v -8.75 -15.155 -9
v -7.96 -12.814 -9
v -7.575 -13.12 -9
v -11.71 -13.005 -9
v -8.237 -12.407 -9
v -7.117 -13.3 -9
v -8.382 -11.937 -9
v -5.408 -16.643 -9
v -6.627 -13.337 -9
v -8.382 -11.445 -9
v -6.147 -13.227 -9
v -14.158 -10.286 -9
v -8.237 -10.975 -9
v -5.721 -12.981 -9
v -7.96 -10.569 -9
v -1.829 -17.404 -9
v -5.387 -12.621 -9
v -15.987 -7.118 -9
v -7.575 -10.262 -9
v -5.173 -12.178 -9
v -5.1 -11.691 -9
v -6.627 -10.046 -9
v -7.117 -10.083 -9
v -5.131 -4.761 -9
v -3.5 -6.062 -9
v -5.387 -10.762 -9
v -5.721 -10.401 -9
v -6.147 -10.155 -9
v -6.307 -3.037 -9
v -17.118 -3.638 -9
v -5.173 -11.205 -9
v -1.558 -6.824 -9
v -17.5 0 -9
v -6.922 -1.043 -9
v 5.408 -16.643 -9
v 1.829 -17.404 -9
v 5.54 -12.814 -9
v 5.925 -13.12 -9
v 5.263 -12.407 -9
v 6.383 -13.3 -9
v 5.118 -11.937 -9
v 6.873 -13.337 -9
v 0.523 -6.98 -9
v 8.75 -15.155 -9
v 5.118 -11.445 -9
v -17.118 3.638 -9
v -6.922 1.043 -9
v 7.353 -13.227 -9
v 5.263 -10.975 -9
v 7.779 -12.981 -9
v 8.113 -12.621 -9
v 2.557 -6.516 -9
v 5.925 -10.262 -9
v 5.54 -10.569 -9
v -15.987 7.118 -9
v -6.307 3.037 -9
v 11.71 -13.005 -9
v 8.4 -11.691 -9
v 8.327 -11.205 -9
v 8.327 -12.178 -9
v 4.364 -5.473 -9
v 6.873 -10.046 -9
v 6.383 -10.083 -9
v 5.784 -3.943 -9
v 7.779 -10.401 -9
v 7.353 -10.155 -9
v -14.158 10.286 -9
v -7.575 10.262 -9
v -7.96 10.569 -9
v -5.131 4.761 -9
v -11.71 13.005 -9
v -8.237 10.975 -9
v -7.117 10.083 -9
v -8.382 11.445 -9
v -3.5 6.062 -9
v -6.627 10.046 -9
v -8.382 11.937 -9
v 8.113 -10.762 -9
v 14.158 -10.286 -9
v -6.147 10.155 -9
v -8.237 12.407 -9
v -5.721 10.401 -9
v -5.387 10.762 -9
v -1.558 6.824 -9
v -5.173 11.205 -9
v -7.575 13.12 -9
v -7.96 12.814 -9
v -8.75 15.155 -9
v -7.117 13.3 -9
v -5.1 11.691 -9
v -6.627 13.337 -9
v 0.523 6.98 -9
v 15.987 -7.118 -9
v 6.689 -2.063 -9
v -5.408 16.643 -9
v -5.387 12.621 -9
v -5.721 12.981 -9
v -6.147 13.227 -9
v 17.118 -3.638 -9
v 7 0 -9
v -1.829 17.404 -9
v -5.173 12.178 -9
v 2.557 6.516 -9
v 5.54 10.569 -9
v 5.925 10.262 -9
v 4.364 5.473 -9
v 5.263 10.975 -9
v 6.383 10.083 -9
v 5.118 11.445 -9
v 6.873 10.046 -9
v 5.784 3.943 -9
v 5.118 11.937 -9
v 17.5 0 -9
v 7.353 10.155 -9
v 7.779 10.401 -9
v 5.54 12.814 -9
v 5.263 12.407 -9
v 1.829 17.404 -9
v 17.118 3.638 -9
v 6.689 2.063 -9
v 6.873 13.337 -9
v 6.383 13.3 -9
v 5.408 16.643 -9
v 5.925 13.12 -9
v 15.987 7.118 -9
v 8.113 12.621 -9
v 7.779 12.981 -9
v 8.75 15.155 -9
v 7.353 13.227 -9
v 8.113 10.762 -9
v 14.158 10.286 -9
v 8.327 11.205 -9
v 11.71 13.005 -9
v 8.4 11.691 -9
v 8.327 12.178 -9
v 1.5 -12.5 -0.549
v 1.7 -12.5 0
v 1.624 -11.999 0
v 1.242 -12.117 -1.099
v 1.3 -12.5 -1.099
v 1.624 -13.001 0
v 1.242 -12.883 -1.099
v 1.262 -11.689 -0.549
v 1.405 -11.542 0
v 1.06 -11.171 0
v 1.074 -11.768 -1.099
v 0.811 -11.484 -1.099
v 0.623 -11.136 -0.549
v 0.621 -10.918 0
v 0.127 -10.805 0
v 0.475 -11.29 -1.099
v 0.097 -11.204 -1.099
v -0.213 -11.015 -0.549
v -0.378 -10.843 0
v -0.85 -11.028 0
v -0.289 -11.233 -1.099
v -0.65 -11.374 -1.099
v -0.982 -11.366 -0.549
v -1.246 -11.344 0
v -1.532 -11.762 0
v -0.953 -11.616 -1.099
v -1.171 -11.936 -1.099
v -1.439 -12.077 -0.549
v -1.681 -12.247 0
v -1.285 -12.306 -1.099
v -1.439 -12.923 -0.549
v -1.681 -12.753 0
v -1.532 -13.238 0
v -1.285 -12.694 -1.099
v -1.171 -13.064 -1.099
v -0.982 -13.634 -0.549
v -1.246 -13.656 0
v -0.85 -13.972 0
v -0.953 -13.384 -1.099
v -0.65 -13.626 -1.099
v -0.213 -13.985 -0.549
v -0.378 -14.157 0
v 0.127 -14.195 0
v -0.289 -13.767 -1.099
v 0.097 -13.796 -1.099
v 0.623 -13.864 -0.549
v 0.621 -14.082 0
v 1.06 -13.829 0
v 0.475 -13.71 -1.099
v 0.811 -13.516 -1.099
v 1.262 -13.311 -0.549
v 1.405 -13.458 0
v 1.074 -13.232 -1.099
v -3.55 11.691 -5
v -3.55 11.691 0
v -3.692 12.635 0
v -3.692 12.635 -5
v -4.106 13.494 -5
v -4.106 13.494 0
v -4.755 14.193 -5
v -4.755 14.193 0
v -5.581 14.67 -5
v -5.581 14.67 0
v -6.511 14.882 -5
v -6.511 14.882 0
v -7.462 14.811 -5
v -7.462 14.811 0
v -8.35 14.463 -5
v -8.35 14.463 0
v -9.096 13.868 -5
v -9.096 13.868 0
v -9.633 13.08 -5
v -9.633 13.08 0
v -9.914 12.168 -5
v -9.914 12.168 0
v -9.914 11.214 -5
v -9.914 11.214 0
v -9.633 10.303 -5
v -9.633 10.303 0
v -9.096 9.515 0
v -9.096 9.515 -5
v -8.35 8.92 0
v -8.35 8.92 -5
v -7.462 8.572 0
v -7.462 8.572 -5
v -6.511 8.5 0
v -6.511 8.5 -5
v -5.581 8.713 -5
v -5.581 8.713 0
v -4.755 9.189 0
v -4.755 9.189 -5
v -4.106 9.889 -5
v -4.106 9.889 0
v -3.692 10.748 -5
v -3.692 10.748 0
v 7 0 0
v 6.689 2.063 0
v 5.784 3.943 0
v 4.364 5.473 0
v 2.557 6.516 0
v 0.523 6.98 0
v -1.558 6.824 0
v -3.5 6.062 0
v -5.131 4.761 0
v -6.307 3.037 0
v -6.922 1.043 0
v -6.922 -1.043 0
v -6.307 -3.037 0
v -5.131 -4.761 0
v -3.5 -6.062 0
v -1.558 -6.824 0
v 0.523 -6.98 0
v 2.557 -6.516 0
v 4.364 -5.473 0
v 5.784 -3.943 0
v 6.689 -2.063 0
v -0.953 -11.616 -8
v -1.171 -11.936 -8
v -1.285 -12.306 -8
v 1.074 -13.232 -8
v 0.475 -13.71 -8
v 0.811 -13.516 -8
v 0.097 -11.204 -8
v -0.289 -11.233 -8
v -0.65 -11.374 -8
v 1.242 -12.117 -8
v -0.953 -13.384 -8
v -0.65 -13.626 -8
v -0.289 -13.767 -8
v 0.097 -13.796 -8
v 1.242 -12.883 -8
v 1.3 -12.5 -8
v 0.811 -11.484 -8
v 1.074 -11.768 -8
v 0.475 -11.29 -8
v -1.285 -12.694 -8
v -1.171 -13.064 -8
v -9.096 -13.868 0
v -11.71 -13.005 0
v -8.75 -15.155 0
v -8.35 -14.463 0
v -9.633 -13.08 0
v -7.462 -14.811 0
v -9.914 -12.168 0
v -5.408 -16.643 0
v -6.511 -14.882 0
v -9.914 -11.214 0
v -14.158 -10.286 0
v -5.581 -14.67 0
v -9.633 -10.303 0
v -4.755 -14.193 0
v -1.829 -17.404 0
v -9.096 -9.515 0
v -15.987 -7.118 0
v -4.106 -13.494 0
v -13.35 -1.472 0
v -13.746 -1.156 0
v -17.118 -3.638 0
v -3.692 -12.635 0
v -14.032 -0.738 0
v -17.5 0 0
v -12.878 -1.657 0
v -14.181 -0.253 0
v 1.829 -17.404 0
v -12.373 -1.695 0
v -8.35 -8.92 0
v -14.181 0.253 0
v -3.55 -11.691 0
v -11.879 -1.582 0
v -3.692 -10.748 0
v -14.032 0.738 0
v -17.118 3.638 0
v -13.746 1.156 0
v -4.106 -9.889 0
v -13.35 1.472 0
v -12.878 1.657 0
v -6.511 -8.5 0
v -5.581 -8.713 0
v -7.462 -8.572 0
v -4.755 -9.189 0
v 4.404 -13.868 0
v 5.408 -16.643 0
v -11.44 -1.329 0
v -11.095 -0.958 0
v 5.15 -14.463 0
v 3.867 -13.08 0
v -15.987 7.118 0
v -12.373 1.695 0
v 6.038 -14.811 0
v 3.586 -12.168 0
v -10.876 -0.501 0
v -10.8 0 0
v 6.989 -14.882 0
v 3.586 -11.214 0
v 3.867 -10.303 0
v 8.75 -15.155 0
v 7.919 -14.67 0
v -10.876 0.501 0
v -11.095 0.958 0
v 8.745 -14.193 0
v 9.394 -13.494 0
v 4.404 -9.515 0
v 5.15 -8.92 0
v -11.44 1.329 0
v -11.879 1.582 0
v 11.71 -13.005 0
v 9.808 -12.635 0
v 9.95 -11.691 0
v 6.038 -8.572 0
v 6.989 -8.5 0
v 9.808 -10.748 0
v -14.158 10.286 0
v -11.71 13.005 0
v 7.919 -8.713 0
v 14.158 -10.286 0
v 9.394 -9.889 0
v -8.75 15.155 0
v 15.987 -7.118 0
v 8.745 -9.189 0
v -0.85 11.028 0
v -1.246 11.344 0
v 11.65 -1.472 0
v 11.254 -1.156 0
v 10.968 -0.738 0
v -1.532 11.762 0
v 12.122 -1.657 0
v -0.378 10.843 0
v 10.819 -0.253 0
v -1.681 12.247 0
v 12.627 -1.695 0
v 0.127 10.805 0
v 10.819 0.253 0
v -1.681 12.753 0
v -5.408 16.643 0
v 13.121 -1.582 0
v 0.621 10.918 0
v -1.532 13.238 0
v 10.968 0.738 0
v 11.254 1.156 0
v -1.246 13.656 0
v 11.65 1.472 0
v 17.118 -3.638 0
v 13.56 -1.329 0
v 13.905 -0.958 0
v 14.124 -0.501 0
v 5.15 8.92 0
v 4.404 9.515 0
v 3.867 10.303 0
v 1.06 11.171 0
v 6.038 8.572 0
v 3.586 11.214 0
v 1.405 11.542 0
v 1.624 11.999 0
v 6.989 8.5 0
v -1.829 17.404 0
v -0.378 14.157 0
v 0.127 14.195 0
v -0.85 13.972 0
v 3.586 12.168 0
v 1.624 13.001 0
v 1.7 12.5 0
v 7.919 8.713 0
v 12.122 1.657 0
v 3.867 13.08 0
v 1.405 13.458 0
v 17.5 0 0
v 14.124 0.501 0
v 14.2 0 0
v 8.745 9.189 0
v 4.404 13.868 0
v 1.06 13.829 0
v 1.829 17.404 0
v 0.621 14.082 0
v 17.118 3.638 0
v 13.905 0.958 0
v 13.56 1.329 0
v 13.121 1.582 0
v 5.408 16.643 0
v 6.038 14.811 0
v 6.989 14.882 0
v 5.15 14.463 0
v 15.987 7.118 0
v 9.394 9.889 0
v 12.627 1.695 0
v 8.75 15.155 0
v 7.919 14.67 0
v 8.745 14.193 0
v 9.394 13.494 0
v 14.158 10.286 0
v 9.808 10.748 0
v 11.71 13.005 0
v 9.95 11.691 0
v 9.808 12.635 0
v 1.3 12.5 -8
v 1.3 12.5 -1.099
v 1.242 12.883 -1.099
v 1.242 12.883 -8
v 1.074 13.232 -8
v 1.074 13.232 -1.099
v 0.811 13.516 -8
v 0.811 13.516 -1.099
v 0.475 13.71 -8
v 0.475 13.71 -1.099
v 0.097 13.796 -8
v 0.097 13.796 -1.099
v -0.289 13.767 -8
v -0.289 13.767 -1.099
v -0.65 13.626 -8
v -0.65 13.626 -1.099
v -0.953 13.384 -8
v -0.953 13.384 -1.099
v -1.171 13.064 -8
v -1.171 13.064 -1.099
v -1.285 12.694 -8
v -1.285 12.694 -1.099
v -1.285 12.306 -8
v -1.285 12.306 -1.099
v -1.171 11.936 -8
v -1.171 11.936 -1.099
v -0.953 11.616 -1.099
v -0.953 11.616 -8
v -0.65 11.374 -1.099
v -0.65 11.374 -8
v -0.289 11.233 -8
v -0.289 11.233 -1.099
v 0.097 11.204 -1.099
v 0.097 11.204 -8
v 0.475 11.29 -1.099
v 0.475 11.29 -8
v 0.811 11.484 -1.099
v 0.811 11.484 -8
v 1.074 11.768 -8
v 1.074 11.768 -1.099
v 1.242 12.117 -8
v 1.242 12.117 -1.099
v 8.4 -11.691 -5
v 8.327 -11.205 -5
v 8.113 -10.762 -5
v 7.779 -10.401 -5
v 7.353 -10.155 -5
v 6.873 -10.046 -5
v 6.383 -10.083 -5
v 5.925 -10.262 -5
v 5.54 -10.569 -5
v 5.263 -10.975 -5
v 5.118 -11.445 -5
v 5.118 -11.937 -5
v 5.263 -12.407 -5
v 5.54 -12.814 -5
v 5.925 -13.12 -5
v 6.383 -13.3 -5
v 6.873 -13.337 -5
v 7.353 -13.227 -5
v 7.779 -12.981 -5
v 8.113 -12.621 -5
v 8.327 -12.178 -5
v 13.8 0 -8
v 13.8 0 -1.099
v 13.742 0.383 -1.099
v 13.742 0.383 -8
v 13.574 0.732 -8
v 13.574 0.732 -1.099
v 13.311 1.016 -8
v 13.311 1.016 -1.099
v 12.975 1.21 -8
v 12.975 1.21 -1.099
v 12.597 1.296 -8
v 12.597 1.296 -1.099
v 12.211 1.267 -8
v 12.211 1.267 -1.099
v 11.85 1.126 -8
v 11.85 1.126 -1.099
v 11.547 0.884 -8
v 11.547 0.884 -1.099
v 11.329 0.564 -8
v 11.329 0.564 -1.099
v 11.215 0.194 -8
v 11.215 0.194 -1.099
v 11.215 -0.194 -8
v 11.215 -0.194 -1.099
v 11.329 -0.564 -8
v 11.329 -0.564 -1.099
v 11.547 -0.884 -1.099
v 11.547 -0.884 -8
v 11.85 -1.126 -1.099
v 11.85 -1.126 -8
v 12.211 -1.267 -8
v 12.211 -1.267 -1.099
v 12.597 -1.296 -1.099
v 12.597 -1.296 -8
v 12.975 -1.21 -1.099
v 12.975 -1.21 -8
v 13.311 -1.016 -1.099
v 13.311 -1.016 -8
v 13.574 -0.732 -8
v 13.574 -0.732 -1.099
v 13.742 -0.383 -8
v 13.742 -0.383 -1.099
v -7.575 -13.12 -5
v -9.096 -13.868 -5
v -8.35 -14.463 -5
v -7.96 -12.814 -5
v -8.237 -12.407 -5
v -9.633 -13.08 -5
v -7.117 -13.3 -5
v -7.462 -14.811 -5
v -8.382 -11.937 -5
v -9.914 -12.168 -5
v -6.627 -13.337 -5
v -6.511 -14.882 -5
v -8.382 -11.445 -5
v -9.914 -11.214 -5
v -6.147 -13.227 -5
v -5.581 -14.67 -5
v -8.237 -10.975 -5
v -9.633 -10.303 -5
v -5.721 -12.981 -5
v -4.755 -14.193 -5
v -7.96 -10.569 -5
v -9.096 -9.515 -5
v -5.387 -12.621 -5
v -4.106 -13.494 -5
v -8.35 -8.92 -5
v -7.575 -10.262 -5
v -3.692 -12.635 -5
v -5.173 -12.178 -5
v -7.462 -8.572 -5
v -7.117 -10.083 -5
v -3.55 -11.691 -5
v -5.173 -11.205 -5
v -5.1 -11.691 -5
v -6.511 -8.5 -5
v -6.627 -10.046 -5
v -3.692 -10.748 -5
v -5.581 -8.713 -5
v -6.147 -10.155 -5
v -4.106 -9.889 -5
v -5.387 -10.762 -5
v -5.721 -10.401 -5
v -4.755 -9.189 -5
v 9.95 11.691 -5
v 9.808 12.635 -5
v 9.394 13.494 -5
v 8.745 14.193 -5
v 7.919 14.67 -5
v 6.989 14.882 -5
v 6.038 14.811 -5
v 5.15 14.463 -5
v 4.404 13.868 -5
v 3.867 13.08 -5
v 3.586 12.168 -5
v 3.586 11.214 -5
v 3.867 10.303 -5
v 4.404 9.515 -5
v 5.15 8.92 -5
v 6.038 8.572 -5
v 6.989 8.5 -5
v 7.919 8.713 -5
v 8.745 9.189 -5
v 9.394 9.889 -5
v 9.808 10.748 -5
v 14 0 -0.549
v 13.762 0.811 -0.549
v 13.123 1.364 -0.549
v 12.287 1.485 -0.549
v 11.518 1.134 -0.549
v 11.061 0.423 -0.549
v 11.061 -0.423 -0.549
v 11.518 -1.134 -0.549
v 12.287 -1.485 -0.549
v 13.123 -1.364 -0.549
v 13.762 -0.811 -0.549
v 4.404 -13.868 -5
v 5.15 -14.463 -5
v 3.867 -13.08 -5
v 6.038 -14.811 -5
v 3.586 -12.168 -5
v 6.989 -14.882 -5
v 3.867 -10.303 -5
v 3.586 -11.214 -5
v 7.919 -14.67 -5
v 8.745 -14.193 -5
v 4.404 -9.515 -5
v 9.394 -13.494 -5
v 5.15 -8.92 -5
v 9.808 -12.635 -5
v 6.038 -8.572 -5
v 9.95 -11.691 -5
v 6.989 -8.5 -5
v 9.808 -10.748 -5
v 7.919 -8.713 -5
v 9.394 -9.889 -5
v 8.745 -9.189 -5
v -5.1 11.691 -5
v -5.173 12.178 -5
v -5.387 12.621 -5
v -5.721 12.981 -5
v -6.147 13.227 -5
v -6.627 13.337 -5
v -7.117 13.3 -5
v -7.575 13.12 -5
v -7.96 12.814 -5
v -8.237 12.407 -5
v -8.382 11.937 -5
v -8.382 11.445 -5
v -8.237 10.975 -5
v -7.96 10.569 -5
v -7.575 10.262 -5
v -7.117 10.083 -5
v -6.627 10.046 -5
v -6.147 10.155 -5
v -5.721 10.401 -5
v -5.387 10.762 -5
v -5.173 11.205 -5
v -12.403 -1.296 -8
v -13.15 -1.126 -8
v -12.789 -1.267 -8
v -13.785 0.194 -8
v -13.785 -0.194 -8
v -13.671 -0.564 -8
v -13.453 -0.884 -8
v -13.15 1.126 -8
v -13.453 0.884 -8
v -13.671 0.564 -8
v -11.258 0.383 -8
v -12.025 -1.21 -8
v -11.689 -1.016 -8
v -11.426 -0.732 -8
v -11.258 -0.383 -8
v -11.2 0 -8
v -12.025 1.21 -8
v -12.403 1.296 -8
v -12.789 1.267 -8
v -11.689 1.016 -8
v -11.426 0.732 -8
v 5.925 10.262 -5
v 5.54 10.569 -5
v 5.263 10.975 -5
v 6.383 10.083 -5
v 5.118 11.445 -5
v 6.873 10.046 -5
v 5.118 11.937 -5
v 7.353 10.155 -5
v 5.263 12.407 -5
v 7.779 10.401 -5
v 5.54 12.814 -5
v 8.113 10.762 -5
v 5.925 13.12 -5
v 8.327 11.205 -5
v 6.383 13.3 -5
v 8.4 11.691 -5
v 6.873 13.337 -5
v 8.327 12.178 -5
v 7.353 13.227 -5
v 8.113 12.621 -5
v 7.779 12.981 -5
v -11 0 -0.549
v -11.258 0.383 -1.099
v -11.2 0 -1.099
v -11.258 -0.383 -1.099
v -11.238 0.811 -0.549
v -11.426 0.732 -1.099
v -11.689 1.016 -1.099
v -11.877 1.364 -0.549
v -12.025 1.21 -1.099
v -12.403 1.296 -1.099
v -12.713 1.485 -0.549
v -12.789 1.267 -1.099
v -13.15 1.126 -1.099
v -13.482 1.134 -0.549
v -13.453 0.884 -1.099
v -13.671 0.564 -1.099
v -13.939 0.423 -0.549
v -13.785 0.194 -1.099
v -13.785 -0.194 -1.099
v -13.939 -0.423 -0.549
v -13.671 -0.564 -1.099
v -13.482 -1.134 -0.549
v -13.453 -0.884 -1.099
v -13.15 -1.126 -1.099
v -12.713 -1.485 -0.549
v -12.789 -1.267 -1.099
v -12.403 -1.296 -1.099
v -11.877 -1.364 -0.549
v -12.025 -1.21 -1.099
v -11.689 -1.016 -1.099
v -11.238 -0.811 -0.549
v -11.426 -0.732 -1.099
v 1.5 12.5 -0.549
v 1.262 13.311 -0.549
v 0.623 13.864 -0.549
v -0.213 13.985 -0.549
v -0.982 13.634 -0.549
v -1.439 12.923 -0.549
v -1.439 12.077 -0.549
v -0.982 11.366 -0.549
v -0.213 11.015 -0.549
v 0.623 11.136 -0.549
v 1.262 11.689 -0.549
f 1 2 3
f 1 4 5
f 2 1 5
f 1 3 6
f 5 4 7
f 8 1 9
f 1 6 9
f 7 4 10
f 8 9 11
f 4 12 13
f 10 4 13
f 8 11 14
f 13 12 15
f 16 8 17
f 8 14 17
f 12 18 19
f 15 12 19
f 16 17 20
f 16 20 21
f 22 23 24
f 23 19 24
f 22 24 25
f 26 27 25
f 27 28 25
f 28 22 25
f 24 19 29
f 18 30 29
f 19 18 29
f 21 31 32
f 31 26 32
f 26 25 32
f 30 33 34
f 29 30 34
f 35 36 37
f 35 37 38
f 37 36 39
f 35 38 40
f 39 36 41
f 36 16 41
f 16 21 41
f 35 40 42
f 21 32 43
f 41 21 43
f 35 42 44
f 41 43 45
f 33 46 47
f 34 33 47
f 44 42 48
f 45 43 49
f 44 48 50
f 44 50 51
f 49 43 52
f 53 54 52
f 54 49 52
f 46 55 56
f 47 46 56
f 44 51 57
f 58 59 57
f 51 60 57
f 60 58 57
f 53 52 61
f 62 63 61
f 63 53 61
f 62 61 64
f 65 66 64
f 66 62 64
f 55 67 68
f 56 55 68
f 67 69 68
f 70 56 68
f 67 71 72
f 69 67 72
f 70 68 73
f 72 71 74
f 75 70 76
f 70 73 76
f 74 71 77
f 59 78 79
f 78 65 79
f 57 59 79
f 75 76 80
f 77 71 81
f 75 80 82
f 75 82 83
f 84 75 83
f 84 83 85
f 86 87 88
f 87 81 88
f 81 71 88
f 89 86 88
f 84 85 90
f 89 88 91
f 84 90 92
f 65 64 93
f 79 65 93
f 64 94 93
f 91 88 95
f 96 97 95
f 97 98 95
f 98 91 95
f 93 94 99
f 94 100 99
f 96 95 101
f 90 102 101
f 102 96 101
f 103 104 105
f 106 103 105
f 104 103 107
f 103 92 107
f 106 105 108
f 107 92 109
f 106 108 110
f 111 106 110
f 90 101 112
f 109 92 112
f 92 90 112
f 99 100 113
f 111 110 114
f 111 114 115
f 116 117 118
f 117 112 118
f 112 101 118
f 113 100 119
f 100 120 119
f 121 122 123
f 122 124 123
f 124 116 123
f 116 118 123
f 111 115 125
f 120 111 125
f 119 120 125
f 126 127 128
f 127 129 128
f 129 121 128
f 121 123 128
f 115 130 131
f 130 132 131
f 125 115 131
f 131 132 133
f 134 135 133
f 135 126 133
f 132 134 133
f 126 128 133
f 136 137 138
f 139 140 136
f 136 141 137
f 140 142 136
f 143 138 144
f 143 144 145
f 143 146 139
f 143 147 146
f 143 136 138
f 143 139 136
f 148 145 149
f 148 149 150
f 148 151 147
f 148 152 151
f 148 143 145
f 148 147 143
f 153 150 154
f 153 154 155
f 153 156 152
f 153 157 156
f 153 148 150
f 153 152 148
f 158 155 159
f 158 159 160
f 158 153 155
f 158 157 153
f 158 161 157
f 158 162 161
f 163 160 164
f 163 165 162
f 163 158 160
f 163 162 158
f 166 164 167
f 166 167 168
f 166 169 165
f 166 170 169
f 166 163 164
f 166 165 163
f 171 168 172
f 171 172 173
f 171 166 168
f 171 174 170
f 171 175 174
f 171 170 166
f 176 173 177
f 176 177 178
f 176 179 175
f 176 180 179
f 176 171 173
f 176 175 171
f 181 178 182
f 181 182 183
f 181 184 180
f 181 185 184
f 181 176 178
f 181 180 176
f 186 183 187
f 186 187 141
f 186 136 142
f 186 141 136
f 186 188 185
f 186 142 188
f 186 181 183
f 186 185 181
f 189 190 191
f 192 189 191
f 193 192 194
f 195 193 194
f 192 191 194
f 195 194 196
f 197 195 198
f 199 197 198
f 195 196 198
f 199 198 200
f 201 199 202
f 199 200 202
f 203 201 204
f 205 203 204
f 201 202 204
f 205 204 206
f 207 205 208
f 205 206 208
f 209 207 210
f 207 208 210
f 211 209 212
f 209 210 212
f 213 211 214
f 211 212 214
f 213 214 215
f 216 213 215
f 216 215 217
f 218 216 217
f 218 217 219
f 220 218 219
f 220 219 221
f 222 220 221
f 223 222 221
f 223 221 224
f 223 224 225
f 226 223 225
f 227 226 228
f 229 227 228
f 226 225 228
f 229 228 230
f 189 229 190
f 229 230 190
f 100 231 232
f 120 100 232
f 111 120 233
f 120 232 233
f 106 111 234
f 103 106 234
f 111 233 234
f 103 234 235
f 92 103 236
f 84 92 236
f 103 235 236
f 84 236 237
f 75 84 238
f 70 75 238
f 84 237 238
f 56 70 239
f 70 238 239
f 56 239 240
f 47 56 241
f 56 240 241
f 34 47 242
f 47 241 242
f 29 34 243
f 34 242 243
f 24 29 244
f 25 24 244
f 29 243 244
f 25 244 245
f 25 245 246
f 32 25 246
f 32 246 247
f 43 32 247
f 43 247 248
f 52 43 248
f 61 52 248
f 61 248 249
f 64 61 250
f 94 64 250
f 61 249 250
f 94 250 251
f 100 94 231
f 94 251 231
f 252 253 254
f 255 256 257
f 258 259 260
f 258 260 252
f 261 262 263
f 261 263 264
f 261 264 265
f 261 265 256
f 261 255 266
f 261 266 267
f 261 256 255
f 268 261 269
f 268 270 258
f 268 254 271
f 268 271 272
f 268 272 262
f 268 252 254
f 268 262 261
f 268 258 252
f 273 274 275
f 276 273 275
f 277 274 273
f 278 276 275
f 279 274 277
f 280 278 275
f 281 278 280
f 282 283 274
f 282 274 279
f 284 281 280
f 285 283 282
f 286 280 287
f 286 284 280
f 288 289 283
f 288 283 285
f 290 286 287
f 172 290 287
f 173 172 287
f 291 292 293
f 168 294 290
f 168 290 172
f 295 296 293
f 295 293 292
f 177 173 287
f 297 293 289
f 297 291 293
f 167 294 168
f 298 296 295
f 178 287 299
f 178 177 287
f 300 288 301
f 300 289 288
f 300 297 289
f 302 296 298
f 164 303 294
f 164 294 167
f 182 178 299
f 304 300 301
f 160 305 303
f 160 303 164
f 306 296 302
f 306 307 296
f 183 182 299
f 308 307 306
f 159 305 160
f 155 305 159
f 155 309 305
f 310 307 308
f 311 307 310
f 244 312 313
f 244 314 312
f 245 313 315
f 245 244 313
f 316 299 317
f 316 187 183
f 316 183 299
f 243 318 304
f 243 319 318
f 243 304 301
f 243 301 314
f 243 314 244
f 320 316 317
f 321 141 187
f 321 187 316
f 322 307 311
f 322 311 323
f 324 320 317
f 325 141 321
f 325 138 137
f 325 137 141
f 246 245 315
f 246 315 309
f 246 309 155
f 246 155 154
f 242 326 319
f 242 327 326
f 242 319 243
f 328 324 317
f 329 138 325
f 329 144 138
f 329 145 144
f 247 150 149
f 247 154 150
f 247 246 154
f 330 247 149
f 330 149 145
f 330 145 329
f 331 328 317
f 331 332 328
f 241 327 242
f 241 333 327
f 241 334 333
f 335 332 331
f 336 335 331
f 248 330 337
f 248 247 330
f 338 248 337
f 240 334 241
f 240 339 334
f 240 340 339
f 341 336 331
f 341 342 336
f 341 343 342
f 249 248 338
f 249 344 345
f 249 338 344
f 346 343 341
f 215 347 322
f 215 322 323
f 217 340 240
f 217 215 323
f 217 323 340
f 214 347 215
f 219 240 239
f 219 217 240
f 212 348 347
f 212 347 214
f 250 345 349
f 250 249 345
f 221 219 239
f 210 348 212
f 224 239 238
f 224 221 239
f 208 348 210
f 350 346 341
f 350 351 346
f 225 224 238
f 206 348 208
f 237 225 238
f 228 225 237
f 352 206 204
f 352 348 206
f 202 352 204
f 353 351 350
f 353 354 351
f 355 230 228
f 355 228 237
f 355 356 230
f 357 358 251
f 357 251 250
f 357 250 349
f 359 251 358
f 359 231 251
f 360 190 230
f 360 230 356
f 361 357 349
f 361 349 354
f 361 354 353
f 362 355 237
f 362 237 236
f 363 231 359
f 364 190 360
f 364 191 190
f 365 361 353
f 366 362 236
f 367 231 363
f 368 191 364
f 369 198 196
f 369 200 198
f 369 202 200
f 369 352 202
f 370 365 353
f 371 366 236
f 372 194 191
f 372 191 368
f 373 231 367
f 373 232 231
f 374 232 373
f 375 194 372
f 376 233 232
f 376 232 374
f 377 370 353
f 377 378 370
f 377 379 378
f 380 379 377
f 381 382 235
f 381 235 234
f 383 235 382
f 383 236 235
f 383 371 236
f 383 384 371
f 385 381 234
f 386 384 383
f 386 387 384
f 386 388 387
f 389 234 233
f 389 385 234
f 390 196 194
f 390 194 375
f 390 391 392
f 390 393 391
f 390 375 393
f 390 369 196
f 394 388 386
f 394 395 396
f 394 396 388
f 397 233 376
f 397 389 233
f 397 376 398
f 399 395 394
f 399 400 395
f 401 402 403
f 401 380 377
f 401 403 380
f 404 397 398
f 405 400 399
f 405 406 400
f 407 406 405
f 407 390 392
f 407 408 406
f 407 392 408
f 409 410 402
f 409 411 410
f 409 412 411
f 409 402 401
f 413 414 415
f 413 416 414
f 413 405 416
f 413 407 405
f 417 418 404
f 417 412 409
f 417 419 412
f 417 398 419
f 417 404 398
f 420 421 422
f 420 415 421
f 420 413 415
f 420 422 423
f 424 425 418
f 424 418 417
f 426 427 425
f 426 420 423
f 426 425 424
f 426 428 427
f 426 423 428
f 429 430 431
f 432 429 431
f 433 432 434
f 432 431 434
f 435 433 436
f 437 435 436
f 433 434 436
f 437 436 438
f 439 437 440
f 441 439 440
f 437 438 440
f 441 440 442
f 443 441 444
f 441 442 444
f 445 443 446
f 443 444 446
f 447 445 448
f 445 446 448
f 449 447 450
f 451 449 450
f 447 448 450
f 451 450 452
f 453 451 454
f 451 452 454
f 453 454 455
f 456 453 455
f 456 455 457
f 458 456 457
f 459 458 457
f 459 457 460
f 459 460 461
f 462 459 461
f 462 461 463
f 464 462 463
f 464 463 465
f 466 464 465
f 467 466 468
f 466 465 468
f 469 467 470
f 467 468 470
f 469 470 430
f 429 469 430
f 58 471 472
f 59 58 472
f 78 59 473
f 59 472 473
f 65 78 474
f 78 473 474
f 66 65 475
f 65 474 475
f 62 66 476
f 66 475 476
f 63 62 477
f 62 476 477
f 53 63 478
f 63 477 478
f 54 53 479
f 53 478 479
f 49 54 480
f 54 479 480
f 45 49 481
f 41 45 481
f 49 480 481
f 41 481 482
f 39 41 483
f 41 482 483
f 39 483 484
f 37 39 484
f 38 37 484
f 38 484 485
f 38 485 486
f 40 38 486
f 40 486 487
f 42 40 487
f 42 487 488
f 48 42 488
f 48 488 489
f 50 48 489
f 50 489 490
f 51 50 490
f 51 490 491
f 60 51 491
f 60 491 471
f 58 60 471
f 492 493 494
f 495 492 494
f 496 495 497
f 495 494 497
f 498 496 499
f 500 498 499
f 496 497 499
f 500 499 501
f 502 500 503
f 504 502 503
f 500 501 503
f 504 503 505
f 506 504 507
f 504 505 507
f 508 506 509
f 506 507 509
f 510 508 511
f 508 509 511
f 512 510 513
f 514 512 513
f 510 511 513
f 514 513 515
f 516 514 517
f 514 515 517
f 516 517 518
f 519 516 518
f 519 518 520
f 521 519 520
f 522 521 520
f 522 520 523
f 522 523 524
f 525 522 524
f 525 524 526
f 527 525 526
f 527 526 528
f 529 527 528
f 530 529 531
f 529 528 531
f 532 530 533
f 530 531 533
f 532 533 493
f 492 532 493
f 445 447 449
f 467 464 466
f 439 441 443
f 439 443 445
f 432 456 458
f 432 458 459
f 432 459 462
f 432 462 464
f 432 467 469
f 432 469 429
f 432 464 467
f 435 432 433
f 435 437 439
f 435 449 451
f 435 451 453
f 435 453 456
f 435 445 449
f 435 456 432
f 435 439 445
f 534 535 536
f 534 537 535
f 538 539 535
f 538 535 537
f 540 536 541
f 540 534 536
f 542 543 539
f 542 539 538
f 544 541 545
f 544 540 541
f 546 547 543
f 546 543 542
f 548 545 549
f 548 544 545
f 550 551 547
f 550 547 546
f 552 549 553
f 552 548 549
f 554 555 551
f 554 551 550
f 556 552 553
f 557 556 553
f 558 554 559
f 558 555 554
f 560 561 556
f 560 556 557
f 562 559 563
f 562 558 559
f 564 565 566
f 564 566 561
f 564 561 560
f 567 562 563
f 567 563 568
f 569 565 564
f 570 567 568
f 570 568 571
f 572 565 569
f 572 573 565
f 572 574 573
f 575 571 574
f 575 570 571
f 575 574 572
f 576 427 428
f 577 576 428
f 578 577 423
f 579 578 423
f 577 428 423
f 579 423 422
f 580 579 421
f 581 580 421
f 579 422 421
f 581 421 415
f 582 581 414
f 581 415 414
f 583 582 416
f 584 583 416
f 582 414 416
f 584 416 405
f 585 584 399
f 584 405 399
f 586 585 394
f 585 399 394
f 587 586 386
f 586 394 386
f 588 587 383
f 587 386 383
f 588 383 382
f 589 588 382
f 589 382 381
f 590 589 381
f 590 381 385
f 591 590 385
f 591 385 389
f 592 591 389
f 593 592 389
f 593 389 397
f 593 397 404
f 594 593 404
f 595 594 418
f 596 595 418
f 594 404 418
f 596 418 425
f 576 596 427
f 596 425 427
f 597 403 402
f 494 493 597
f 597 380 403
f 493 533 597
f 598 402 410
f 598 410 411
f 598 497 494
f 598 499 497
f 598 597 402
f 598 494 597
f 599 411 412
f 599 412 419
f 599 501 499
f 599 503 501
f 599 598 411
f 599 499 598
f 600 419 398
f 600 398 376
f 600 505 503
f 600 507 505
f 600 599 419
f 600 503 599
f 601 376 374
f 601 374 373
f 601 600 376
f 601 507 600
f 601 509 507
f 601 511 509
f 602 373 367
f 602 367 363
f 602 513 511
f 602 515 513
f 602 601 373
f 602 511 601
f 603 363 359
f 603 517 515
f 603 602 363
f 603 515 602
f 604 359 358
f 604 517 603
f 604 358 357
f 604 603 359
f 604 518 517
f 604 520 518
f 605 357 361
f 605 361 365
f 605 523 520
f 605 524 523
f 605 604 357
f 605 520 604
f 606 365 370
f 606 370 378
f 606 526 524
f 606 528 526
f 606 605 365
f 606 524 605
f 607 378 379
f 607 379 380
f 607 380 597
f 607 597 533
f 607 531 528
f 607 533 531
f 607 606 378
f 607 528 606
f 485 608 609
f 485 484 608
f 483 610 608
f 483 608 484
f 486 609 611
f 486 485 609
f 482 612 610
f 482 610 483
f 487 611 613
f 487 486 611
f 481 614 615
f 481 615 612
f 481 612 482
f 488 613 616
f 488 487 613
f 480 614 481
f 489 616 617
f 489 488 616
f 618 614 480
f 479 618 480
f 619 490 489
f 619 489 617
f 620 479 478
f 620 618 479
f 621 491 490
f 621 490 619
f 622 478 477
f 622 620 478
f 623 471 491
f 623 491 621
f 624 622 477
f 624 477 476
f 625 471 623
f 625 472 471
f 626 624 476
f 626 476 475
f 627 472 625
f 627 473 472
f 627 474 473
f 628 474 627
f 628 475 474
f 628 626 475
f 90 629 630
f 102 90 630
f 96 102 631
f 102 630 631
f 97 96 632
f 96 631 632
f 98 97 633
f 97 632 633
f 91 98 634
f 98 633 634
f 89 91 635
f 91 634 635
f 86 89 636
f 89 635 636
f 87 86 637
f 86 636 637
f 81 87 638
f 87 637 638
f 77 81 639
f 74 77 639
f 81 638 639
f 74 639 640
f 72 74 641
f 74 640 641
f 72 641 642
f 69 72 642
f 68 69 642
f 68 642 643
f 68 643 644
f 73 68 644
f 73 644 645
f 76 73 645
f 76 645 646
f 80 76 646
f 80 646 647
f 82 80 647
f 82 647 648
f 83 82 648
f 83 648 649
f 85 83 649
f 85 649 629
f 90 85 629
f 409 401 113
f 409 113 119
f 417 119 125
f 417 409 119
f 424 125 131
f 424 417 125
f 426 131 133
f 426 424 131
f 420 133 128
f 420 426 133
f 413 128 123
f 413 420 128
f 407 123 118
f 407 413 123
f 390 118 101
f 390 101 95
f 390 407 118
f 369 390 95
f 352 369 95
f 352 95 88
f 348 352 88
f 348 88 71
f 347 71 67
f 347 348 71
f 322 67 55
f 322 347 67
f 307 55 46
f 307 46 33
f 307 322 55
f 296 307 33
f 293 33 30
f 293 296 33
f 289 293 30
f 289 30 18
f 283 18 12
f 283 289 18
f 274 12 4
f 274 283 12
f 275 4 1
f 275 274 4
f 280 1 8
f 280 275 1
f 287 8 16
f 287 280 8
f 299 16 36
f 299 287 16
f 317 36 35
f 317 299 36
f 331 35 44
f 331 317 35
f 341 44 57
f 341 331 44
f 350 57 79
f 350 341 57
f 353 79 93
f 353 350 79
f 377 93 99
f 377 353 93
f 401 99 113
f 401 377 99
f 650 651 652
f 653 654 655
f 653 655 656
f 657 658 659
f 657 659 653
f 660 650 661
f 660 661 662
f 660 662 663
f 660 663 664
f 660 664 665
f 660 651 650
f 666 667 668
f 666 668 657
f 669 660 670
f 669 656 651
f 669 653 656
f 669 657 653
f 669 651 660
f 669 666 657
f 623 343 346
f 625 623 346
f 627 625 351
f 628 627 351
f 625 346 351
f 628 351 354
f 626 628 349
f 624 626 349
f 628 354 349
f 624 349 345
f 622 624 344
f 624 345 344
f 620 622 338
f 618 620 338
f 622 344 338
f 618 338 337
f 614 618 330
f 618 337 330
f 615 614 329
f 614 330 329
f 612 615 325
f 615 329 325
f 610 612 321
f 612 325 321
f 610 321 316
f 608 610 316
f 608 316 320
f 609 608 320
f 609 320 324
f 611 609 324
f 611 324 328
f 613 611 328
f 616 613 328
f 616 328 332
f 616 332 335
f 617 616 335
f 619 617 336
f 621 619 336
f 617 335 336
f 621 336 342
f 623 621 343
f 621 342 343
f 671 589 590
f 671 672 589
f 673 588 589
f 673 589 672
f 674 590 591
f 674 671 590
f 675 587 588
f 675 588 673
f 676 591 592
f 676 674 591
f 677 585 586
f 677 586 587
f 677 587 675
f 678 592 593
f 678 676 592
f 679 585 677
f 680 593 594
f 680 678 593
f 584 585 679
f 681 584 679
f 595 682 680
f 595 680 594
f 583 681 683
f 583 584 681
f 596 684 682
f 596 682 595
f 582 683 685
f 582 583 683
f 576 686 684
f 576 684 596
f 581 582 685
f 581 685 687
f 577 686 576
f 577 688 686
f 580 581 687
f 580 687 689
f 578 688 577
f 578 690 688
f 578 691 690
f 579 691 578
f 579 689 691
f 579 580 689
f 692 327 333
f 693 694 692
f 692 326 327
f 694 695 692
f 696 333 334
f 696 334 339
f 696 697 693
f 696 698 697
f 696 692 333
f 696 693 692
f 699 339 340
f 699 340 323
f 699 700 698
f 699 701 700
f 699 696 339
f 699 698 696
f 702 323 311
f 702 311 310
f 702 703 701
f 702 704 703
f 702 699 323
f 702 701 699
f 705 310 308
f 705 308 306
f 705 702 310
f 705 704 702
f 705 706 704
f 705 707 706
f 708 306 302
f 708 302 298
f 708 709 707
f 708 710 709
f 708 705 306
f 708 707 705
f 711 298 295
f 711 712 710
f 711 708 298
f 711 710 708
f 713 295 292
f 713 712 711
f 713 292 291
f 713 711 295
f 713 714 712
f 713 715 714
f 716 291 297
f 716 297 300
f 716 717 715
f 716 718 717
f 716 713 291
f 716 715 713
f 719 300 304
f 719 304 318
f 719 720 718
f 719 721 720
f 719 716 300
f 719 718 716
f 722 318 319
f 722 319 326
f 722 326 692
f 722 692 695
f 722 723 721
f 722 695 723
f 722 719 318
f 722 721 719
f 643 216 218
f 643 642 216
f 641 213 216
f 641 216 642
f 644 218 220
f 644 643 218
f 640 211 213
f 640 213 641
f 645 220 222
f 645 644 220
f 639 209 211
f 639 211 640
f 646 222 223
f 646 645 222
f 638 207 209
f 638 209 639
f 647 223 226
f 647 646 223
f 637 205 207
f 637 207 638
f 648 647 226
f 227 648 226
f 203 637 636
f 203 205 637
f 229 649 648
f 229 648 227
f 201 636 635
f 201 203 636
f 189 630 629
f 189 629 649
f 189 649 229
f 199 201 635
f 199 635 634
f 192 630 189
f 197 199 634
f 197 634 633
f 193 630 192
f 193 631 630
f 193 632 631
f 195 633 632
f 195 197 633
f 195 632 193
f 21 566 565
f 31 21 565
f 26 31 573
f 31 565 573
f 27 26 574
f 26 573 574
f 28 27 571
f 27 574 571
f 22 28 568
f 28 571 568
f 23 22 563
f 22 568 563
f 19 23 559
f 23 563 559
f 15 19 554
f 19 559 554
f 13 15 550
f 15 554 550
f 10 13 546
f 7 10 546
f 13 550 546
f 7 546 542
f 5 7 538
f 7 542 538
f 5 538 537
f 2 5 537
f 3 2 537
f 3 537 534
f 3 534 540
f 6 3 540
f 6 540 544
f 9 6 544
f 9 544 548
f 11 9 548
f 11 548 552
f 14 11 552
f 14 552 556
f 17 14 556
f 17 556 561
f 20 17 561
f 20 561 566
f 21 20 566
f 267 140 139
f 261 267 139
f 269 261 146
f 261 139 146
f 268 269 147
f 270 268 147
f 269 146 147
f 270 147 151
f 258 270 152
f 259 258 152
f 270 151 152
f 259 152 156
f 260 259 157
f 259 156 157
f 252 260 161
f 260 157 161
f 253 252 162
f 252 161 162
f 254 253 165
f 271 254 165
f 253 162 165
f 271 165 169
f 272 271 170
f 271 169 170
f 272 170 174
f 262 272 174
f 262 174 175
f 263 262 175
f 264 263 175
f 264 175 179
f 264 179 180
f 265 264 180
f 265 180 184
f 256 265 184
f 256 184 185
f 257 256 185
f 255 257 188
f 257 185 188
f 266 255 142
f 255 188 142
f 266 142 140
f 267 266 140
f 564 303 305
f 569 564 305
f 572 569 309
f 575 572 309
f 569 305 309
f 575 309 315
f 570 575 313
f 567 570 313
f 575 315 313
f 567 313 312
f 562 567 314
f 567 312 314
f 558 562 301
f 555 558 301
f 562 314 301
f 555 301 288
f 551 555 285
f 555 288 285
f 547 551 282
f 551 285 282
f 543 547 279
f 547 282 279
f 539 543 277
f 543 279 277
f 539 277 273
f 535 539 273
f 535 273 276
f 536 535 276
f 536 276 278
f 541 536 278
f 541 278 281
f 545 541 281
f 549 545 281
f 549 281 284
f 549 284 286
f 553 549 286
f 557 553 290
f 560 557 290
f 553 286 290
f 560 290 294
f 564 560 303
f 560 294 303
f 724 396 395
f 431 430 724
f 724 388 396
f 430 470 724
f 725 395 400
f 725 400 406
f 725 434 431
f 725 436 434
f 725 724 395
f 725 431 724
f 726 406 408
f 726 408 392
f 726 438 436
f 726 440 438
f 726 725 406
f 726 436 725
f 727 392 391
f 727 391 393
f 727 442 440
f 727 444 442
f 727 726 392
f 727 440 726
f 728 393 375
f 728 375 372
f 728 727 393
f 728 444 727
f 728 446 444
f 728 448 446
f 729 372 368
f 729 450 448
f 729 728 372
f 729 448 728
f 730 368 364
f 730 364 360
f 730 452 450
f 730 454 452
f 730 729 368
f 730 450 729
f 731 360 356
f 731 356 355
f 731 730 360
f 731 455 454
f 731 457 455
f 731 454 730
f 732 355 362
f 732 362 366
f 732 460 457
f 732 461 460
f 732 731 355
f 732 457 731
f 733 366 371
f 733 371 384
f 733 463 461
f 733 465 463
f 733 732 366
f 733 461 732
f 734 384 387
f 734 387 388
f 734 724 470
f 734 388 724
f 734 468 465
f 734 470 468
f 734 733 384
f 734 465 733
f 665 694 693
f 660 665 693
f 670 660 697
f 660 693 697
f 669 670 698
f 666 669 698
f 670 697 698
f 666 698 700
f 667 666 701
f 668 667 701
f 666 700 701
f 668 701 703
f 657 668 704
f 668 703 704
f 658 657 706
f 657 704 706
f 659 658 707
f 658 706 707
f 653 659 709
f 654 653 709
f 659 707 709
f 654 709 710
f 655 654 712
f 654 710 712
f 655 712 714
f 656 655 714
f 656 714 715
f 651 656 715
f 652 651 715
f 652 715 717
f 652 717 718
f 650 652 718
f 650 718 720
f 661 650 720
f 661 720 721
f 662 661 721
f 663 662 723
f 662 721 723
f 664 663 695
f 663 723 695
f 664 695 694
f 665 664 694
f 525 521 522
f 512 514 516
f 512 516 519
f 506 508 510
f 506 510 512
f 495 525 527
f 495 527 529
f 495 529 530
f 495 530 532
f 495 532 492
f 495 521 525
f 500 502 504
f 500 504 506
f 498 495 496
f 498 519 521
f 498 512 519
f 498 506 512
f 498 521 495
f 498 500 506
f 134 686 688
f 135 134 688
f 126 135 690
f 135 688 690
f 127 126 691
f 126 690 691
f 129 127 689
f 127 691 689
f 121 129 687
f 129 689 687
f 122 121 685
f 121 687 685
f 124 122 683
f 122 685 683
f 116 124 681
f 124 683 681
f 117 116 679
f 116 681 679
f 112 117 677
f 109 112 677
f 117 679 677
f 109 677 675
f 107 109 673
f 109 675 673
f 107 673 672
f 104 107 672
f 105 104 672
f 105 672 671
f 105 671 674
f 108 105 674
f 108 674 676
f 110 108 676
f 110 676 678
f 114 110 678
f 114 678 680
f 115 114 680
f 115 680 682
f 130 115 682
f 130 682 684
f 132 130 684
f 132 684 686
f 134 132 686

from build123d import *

# Parameters (mm, degrees)
SKETCH_1_R          = 17.5
EXTRUDE_1_DEPTH     = 9
SKETCH_2_R          = 1.3
CUT_EXTRUDE_1_DEPTH = 8
SKETCH_3_R          = 1.65
CUT_EXTRUDE_2_DEPTH = 9
SKETCH_4_R          = 7
CUT_EXTRUDE_3_DEPTH = 9
CHAMFER_1_SIZE      = 0.4
CHAMFER_1_SIZE2     = 1.098990968
SKETCH_5_R          = 3.2
CUT_EXTRUDE_4_DEPTH = 5


with BuildPart() as part:
    # 草图1 → 凸台-拉伸1 (new body)
    with BuildSketch(Plane.XY):
        Circle(SKETCH_1_R)
    extrude(amount=-EXTRUDE_1_DEPTH)

    # 草图2 → 切除-拉伸1 (cut)
    with BuildSketch(Plane.XY):
        with Locations((12.5, 0)):
            Circle(SKETCH_2_R)
        with Locations((0, -12.5)):
            Circle(SKETCH_2_R)
        with Locations((-12.5, 0)):
            Circle(SKETCH_2_R)
        with Locations((0, 12.5)):
            Circle(SKETCH_2_R)
    extrude(amount=-CUT_EXTRUDE_1_DEPTH, mode=Mode.SUBTRACT)

    # 草图3 → 切除-拉伸2 (cut)
    with BuildSketch(Plane.XY):
        with Locations((6.75, -11.691342951)):
            Circle(SKETCH_3_R)
        with Locations((-6.75, -11.691342951)):
            Circle(SKETCH_3_R)
        with Locations((-6.75, 11.691342951)):
            Circle(SKETCH_3_R)
        with Locations((6.75, 11.691342951)):
            Circle(SKETCH_3_R)
    extrude(amount=-CUT_EXTRUDE_2_DEPTH, mode=Mode.SUBTRACT)

    # 草图4 → 切除-拉伸3 (cut)
    with BuildSketch(Plane.XY):
        Circle(SKETCH_4_R)
    extrude(amount=-CUT_EXTRUDE_3_DEPTH, mode=Mode.SUBTRACT)

    # 倒角1
    chamfer_1_edges = [part.edges().sort_by_distance(p)[0] for p in [
        (-1.3, -12.5, 0),
        (-13.8, 0, 0),
        (-1.3, 12.5, 0),
        (11.2, 0, 0),
    ]]
    chamfer_1_side = [part.faces().sort_by_distance(p)[0] for p in [
        (-17.005025253, 0, 0),
    ]]
    chamfer(chamfer_1_edges, length=CHAMFER_1_SIZE, length2=CHAMFER_1_SIZE2, reference=chamfer_1_side[0])

    # 草图5 → 切除-拉伸4 (cut)
    with BuildSketch(Plane.XY):
        with Locations((-6.75, 11.691342951)):
            Circle(SKETCH_5_R)
        with Locations((6.75, 11.691342951)):
            Circle(SKETCH_5_R)
        with Locations((6.75, -11.691342951)):
            Circle(SKETCH_5_R)
        with Locations((-6.75, -11.691342951)):
            Circle(SKETCH_5_R)
    extrude(amount=-CUT_EXTRUDE_4_DEPTH, mode=Mode.SUBTRACT)


solid = part.part
